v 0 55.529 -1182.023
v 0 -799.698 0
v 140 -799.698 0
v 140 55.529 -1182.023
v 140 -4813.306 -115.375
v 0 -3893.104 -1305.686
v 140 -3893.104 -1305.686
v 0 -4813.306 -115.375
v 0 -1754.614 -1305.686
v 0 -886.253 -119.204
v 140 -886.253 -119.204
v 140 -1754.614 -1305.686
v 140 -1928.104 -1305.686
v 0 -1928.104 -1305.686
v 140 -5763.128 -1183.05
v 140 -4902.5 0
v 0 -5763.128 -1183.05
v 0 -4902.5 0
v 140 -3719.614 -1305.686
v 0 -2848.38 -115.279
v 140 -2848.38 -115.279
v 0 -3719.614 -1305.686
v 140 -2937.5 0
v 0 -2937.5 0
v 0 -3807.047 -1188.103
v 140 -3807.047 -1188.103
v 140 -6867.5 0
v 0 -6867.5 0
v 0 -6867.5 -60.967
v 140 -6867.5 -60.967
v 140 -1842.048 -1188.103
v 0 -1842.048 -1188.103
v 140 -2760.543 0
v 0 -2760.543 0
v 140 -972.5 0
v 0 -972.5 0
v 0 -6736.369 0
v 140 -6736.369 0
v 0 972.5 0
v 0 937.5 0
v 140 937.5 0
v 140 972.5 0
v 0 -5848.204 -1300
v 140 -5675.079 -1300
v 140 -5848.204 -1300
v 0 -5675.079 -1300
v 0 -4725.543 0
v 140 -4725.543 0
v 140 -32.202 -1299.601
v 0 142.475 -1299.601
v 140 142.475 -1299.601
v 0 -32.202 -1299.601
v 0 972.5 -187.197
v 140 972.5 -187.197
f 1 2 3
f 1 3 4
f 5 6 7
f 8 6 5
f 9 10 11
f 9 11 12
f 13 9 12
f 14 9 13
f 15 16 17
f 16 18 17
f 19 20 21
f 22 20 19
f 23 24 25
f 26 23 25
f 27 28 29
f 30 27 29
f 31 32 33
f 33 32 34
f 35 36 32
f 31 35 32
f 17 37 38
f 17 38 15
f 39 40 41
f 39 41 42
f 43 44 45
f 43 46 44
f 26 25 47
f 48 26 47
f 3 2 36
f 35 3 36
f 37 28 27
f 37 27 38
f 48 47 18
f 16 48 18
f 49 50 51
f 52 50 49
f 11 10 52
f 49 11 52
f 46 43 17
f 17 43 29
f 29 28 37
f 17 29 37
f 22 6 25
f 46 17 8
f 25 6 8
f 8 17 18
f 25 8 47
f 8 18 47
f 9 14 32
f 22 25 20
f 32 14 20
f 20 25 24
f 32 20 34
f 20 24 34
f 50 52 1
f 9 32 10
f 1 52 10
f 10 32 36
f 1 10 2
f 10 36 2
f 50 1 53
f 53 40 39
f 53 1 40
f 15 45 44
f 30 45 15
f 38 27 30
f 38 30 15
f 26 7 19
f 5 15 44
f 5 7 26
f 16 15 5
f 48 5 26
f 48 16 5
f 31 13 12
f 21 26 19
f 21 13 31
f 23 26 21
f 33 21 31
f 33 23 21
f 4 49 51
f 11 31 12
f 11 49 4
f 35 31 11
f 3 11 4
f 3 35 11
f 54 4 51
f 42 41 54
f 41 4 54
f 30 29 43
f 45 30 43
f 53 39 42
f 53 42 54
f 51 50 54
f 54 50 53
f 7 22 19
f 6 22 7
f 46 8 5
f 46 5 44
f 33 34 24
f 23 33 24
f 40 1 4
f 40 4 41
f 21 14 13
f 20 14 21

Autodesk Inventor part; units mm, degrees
ref_plane "YZ Plane" through (0, 0, 0) normal (1, 0, 0) x (0, 1, 0)
ref_plane "XZ Plane" through (0, 0, 0) normal (0, 1, 0) x (-1, 0, 0)
ref_plane "XY Plane" through (0, 0, 0) normal (0, 0, 1) x (1, 0, 0)
sketch "Sketch1" plane through (0, 0, 0) normal (1, 0, 0) x (0, 1, 0)
  line L0 (937.5, 0) -> (972.5, 0)
  line L1 (142.4751, -1299.6011) -> (-32.2024, -1299.6011)
  line L2 (-799.6982, 0) -> (-972.5, 0)
  line L3 (-972.5, 0) -> (-32.2024, -1299.6011)
  line L4 (-799.6982, 0) -> (55.5287, -1182.0234)
  line L5 (-2760.5427, 0) -> (-2937.5, 0)
  line L6 (-972.5, 0) -> (-1928.1041, -1305.6863)
  line L7 (-886.2529, -119.2036) -> (-1754.6144, -1305.6863)
  line L8 (-1754.6144, -1305.6863) -> (-1928.1041, -1305.6863)
  line L9 (-1928.1041, -1305.6863) -> (-2937.5, 0)
  line L10 (-1842.0475, -1188.1032) -> (-2760.5427, 0)
  line L11 (-2937.5, 0) -> (-3893.1041, -1305.6863)
  line L12 (-2848.3805, -115.2789) -> (-3719.6144, -1305.6863)
  line L13 (-3893.1041, -1305.6863) -> (-4902.5, 0)
  line L14 (-3717.928, -1303.3821) -> (-4725.5427, 0)
  line L15 (-4902.5, 0) -> (-5848.2043, -1300)
  line L16 (-4813.306, -115.3753) -> (-5675.0789, -1300)
  line L17 (-3719.6144, -1305.6863) -> (-3893.1041, -1305.6863)
  line L18 (-5675.0789, -1300) -> (-5848.2043, -1300)
  line L19 (142.4751, -1299.6011) -> (972.5, -187.1966)
  line L20 (-32.2024, -1299.6011) -> (937.5, 0)
  line L21 (972.5, 0) -> (972.5, -187.1966)
  line L22 (-6867.5, 0) -> (-6736.369, 0)
  line L23 (-6867.5, -60.967) -> (-5848.2043, -1300)
  line L24 (-6736.369, 0) -> (-5763.1277, -1183.0505)
  line L25 (-6867.5, 0) -> (-6867.5, -60.967)
  line L26 (-4725.5427, 0) -> (-4902.5, 0)
  line L27 (142.4751, -1299.6011) -> (-6414.4595, -1299.6011)
  line L28 (-4902.5, 0) -> (-4052.5, 0) construction
  point P0 (0, 0)
  point P1 (-3807.0475, -1188.1032)
  point P2 (-5806.9041, -1243.2271)
  dimension "d0" = 972.5
  dimension "d1" = 1300
  dimension "d5" = 972.5
  dimension "d6" = 140
  dimension "d7" = 1965
  dimension "d8" = 140
  dimension "d9" = 140
  dimension "d10" = 1965
  dimension "d11" = 140
  dimension "d12" = 140
  dimension "d13" = 1965
  dimension "d14" = 140
  dimension "d24" = 35
  dimension "d27" = 140
  dimension "d32" = 140
extrude "Extrusion2" add sketch "Sketch1" along normal blind 140 contours L0 L21 L19 L1 L20 | L20 L3 L2 L4 | L3 L7 L27 L6 | L7 L8 L6 L27 | L6 L27 L9 L5 L10 | L6 L9 L27 | L9 L12 L27 L14 L11 | L12 L14 L27 | L14 L27 L11 | L11 L27 L13 L26 L14 | L12 L17 L11 L27 L14 | L11 L13 L27 | L13 L16 L27 L15 | L16 L18 L15 L27 | L15 L27 L23 L25 L22 L24 | L15 L23 L27
properties part number "Truss Structure" material "Stainless Steel"
